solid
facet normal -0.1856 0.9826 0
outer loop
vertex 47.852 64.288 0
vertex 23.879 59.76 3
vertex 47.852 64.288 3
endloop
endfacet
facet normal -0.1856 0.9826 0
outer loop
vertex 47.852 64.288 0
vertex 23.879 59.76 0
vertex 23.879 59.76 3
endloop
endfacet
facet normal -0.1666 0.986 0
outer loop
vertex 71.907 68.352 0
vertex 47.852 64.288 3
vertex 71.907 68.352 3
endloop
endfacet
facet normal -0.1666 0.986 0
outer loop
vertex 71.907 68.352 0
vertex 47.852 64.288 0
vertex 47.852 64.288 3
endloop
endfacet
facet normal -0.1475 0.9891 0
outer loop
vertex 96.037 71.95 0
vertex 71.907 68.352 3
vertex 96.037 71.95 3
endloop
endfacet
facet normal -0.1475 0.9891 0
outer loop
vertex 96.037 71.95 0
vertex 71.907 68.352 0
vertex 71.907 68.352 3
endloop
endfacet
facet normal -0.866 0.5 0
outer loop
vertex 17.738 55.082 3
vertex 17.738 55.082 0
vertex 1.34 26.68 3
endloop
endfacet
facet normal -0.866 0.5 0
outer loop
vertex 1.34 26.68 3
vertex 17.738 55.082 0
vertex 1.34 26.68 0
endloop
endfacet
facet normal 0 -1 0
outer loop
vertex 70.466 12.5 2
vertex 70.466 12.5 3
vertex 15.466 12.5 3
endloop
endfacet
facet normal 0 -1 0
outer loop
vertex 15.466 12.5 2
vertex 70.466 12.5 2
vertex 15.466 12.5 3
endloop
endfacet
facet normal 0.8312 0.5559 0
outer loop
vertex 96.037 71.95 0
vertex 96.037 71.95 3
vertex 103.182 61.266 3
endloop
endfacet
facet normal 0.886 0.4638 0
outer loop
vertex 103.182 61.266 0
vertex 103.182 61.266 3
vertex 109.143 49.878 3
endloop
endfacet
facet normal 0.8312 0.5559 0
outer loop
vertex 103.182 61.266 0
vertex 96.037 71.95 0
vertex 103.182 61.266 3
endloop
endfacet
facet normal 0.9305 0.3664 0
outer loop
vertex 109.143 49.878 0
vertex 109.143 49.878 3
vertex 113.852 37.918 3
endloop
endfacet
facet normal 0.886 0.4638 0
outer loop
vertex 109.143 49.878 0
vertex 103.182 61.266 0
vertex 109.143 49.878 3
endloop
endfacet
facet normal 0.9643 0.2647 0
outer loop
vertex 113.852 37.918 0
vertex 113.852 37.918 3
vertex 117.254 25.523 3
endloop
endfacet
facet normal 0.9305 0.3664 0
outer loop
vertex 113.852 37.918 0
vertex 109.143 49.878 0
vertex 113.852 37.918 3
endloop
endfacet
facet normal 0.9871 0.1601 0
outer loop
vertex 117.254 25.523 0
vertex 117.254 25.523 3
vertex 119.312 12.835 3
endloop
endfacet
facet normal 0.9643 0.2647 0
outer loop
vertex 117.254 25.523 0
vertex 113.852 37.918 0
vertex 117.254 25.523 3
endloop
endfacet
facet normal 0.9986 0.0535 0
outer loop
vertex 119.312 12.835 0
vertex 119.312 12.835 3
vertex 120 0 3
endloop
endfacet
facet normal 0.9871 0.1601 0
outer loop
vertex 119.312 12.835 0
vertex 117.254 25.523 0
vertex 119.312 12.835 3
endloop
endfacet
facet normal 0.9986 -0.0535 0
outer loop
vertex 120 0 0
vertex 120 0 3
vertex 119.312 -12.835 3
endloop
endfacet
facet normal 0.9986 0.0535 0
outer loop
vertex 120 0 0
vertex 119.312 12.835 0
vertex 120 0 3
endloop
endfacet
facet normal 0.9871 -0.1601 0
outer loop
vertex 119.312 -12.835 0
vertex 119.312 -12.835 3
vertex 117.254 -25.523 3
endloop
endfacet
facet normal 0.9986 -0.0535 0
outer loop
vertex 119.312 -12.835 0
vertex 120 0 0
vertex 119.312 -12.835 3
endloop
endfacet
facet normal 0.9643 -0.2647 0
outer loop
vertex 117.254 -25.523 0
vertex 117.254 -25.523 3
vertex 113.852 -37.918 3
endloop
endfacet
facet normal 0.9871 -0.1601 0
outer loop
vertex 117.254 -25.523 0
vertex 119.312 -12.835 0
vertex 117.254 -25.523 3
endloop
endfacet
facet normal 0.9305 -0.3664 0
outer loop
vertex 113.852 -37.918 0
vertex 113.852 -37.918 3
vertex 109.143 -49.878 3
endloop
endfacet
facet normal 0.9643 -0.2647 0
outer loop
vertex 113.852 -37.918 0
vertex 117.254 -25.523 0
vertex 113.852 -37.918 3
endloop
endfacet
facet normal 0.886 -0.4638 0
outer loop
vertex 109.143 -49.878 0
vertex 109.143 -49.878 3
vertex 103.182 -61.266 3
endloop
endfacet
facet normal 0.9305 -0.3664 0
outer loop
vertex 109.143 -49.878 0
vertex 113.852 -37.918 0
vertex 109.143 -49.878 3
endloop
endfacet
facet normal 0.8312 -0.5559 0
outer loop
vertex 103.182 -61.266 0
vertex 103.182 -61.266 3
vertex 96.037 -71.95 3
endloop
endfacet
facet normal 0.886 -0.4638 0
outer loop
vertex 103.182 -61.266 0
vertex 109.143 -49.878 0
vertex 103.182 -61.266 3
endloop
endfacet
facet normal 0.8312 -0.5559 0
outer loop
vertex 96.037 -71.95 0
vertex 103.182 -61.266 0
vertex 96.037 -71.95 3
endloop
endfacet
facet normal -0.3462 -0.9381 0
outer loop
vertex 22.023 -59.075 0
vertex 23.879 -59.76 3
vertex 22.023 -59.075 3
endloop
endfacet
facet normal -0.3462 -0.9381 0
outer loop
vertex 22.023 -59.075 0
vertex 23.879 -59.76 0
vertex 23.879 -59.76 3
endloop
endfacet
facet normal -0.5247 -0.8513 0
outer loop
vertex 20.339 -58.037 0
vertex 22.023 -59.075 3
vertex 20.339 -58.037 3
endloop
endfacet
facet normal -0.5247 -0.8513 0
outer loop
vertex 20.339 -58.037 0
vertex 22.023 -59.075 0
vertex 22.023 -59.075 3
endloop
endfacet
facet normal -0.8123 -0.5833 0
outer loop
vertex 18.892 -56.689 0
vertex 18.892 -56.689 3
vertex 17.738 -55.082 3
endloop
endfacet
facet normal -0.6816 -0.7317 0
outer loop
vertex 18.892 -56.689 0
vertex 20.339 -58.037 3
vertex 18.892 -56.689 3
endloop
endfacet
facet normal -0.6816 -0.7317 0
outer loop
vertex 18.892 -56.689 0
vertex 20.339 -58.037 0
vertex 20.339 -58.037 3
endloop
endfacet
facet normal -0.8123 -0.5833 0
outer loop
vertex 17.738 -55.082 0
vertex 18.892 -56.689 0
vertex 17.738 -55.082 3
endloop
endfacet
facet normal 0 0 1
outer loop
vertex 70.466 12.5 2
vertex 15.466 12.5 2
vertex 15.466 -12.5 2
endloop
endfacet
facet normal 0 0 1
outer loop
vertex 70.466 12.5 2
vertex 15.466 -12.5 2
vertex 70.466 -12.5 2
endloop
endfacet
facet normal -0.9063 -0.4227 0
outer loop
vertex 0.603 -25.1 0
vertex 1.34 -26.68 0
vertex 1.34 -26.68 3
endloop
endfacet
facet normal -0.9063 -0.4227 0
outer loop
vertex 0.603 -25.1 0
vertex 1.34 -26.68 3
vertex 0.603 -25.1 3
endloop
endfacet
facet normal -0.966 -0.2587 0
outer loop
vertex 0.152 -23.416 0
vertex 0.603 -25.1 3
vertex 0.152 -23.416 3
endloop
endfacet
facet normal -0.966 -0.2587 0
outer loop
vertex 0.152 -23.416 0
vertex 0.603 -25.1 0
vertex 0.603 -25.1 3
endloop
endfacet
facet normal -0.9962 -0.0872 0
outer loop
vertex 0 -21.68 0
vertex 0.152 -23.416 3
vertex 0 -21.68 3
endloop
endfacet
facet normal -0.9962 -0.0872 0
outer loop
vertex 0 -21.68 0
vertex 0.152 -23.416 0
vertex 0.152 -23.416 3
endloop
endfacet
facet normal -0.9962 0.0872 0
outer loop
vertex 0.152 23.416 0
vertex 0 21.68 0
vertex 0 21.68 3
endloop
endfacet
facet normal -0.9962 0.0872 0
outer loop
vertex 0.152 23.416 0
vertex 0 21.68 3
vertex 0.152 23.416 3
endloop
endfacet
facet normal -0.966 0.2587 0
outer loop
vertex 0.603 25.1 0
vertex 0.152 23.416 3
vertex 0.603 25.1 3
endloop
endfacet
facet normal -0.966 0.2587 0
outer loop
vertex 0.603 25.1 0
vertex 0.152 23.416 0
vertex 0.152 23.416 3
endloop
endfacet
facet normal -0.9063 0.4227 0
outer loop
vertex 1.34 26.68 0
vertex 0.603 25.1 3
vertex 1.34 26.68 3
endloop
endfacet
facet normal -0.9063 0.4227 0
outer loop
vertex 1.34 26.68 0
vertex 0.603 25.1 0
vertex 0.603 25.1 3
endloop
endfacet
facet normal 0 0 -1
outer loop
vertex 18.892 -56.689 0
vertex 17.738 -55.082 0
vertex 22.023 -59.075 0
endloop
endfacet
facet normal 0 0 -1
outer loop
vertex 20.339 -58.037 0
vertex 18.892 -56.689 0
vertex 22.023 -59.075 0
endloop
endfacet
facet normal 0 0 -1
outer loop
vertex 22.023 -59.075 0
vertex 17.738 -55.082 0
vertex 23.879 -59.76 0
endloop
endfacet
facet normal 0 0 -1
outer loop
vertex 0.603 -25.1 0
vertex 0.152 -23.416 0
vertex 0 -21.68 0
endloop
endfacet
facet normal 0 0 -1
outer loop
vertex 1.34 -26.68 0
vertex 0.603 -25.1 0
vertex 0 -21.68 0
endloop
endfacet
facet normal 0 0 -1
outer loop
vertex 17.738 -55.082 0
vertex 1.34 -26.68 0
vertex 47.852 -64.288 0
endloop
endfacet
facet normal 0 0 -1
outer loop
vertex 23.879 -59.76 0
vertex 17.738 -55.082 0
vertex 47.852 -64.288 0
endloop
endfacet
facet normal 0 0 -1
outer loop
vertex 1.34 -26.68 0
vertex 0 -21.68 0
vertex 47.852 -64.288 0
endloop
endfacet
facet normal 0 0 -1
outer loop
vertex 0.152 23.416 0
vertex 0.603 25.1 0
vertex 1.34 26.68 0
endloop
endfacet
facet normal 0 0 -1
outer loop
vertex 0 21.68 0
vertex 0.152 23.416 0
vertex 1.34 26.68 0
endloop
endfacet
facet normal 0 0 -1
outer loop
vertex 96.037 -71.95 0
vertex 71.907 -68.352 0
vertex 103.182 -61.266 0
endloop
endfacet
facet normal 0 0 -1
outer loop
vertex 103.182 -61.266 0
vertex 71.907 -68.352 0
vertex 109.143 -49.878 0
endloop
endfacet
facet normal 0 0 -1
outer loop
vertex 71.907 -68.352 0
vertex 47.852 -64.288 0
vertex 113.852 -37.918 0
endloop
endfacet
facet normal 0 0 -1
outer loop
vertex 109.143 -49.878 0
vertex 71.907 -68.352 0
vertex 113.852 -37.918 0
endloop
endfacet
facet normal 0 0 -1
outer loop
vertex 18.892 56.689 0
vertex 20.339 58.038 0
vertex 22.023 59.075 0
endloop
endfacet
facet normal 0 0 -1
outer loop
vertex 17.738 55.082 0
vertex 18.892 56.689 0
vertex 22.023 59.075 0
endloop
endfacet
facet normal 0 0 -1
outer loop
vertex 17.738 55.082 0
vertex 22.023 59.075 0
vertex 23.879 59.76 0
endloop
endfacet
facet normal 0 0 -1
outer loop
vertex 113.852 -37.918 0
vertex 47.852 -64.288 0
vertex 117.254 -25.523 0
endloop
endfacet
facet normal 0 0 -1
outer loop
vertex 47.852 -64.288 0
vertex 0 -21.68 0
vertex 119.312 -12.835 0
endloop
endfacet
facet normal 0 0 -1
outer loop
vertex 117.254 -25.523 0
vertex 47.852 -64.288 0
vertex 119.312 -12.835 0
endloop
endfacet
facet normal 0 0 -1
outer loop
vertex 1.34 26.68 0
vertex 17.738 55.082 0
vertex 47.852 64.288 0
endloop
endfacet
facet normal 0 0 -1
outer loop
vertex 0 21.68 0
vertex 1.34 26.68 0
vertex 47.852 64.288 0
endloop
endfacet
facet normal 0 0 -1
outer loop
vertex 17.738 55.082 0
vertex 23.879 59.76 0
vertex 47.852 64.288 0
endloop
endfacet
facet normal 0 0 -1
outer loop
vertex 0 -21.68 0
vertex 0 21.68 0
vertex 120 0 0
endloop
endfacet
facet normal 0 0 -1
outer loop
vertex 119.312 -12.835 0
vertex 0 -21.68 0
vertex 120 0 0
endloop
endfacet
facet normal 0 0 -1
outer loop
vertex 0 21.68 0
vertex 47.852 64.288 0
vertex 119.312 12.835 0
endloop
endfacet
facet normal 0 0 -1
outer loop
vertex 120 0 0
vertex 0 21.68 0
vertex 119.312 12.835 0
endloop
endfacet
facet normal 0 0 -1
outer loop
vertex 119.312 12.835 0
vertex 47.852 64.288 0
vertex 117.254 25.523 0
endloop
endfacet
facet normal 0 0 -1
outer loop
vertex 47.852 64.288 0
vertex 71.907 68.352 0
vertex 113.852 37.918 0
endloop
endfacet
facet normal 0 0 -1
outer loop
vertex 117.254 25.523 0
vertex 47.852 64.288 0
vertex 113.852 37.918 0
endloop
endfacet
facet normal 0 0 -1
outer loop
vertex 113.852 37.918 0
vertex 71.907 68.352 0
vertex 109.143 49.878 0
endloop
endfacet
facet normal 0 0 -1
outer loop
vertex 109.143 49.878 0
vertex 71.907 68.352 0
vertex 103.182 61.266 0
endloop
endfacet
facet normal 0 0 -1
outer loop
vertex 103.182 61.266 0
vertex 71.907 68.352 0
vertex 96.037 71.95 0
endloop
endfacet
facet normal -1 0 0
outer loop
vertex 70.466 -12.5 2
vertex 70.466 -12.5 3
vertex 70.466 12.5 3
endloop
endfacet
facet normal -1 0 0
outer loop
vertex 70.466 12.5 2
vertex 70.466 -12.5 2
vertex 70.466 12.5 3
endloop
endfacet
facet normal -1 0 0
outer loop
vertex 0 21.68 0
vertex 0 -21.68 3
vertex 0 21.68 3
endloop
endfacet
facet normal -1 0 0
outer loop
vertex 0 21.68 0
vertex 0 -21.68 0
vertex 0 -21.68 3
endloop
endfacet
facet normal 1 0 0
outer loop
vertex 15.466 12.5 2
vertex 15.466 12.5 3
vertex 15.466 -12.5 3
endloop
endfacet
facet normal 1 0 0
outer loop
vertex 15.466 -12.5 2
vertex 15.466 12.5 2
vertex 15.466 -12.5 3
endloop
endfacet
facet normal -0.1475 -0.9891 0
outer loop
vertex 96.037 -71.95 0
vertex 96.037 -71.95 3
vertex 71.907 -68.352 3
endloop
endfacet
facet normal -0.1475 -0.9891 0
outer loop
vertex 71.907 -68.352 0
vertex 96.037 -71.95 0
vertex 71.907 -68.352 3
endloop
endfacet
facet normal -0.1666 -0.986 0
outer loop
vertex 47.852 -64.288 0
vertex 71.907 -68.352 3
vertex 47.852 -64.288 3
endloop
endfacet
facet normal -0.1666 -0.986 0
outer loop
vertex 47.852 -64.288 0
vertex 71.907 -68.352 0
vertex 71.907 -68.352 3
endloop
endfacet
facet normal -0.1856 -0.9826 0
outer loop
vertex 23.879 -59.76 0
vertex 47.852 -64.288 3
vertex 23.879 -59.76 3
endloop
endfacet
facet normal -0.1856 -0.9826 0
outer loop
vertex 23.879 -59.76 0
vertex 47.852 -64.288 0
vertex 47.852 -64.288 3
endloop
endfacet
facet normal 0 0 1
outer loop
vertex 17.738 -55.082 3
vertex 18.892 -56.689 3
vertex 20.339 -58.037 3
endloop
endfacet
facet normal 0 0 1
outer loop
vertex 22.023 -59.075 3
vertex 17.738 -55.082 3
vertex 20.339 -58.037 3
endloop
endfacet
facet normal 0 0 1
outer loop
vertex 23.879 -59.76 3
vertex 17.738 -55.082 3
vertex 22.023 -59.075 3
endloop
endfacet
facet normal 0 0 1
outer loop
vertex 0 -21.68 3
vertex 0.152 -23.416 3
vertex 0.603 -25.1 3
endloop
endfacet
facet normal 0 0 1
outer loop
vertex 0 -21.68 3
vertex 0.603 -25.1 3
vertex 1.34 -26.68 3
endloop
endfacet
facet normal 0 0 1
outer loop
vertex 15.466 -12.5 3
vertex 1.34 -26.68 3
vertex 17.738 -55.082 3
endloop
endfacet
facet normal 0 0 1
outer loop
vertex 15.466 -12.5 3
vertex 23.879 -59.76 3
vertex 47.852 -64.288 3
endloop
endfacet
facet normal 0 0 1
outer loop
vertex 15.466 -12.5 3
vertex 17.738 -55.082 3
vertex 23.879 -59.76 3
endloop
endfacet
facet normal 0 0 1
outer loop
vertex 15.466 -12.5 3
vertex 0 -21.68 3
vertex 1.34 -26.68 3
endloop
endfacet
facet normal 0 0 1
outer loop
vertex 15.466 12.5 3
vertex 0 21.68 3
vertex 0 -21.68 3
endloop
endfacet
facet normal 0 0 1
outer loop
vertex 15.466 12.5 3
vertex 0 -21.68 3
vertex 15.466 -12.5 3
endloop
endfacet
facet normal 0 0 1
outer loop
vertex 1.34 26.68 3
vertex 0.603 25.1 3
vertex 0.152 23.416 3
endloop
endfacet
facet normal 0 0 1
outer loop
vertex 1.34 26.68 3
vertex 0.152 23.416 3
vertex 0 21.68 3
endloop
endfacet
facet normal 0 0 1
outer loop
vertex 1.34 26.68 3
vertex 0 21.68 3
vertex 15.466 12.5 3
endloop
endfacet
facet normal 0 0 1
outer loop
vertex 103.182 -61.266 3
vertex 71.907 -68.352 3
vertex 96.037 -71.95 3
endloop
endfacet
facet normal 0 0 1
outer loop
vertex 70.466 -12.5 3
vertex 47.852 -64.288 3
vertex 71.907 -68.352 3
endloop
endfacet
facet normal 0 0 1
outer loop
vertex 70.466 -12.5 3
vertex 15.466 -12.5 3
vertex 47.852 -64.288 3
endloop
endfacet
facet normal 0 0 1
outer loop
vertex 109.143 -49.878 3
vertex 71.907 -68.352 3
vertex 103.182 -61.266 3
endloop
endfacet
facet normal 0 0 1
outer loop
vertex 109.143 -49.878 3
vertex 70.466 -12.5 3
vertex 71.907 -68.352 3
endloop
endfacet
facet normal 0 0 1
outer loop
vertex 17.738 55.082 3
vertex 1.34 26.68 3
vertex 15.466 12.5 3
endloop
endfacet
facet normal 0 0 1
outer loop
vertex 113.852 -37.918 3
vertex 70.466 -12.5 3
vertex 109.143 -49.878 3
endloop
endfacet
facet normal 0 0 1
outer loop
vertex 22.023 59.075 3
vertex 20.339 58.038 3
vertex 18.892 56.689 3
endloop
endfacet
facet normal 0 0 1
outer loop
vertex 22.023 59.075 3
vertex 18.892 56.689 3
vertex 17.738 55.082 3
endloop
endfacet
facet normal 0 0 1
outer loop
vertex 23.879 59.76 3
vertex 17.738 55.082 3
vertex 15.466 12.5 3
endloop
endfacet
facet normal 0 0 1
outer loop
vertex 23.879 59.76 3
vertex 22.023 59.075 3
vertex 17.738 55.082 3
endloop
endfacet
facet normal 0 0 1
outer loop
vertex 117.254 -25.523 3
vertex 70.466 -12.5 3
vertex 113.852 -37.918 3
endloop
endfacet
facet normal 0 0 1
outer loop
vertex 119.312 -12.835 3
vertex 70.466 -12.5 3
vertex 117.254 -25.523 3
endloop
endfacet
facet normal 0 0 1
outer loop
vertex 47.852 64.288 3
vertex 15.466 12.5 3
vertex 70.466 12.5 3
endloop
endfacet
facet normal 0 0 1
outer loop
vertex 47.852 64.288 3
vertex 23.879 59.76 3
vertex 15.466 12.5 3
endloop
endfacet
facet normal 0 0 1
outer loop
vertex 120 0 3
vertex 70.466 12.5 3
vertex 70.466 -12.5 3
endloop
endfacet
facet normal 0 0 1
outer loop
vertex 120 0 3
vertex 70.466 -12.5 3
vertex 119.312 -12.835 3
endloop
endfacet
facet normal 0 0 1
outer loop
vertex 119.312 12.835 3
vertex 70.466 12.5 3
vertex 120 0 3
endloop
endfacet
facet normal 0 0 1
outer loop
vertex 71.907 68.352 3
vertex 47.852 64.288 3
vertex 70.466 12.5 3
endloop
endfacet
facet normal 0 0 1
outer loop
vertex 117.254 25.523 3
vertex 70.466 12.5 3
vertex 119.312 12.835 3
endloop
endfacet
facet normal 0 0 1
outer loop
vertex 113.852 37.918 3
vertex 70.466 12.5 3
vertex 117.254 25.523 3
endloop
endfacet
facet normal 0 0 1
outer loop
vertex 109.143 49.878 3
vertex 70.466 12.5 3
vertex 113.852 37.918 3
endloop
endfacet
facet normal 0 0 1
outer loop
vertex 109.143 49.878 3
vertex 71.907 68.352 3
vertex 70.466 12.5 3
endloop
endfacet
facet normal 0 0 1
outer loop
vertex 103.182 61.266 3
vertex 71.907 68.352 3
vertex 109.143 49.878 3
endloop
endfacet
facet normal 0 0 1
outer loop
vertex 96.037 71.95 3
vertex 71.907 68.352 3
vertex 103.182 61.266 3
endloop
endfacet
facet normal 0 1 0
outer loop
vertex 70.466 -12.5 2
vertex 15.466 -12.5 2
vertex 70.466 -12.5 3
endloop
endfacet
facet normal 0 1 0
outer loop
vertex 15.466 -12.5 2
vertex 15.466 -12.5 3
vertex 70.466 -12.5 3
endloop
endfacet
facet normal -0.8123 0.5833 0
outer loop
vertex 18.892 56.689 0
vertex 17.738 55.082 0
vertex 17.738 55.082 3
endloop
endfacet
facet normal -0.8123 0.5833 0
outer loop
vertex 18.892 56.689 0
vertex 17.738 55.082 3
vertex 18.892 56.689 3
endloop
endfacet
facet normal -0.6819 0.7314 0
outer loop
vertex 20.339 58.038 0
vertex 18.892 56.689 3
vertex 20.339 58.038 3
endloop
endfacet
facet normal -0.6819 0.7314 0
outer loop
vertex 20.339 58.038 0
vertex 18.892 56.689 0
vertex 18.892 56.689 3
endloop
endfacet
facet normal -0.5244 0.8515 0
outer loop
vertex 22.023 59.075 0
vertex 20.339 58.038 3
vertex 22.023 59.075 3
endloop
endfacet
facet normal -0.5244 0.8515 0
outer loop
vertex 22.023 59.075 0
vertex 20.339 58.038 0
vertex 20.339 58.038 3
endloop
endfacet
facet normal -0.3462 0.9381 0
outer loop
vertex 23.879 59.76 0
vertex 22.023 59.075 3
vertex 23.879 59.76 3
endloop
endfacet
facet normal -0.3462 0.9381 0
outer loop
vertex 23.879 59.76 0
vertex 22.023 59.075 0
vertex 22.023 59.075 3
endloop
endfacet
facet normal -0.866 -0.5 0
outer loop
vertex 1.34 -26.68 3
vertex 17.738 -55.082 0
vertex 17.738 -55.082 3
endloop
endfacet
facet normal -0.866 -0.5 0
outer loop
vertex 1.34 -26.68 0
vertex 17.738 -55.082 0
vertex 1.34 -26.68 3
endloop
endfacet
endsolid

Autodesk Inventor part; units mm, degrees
ref_plane "YZ Plane" through (0, 0, 0) normal (1, 0, 0) x (0, 1, 0)
ref_plane "XZ Plane" through (0, 0, 0) normal (0, 1, 0) x (-1, 0, 0)
ref_plane "XY Plane" through (0, 0, 0) normal (0, 0, 1) x (1, 0, 0)
sketch "Sketch3" plane through (0, 0, 0) normal (0, 0, 1) x (1, 0, 0)
  line L0 (-124.5182, 0) -> (335.753, 0) projected
  line L1 (0, -1648.3682) -> (0, 1648.3682) projected
  line L2 (-58.7652, -57.1704) -> (105.7311, -56.7534) construction
  line L3 (17.7382, 55.0824) -> (1.3397, 26.6795)
  line L4 (17.7382, -55.0824) -> (1.3397, -26.6795)
  line L5 (20, -59) -> (52.7968, -59) construction
  arc A0 (23.8789, 59.7598) -> (17.7382, 55.0824) centre (26.3984, 50.0824) ccw
  arc A1 (17.7382, -55.0824) -> (23.8789, -59.7598) centre (26.3984, -50.0824) ccw
  line L6 (0, 21.6795) -> (0, -21.6795)
  arc A2 (96.0371, -71.9505) -> (96.0371, 71.9505) centre (0, 0) ccw
  line L7 (96.0371, 71.9505) -> (96.0371, -71.9505) construction
  arc A3 (96.0371, 71.9505) -> (23.8789, 59.7598) centre (270, -1177.4058) ccw
  arc A4 (23.8789, -59.7598) -> (96.0371, -71.9505) centre (270, 1177.4058) ccw
  arc A5 (1.3397, 26.6795) -> (0, 21.6795) centre (10, 21.6795) ccw
  arc A6 (0, -21.6795) -> (1.3397, -26.6795) centre (10, -21.6795) ccw
  point P0 (0, 24.359)
  point P1 (0, -24.359)
  point P2 (0, -24.359)
  dimension "d8" = 40
  dimension "d9" = 120
  dimension "d10" = 10
  dimension "d11" = 10
  dimension "d13" = 120
  dimension "d15" = 48.718
  dimension "d16" = 30.7234
  dimension "d17" = 30.7234
  dimension "d18" = 100.1648
  dimension "d19" = 270
  dimension "d20" = 1261.4097
  dimension "d21" = 10
  dimension "d24" = 143.901
extrude "Extrusion1" add sketch "Sketch3" along normal blind 3
sketch "Sketch4" plane through (0, 0, 3) normal (0, 0, 1) x (1, 0, 0)
  line L0 (15.466, -12.5) -> (70.466, -12.5)
  line L1 (70.466, -12.5) -> (70.466, 12.5)
  line L2 (70.466, 12.5) -> (15.466, 12.5)
  line L3 (15.466, 12.5) -> (15.466, -12.5)
  line L4 (15.466, -12.5) -> (70.466, 12.5) construction
  line L5 (70.466, -12.5) -> (15.466, 12.5) construction
  point P0 (0, 0)
  point P1 (42.966, 0)
  dimension "d31" = 55
  dimension "d32" = 25
extrude "Extrusion2" cut sketch "Sketch4" against normal blind 1
equation "\"d8\" = d6"
equation "\"d9\" = d7"
equation "\"d11\" = d10"
equation "\"d17\" = d16"
equation "\"BendRadius\" = Thickness"
equation "\"BendReliefWidth\" = Thickness"
equation "\"BendReliefDepth\" = 0.5 * Thickness"
equation "\"CornerReliefSize\" = 4 * Thickness"
equation "\"MinimumRemnant\" = 2 * Thickness"
equation "\"TransitionRadius\" = BendRadius"
equation "\"JacobiRadiusSize\" = BendRadius"
equation "\"GapSize\" = Thickness"
equation "\"d7\" = 120deg"
equation "\"Thickness\" = 0.5"
equation "\"d6\" = 40"
properties part number "Handle bars holder plates"
